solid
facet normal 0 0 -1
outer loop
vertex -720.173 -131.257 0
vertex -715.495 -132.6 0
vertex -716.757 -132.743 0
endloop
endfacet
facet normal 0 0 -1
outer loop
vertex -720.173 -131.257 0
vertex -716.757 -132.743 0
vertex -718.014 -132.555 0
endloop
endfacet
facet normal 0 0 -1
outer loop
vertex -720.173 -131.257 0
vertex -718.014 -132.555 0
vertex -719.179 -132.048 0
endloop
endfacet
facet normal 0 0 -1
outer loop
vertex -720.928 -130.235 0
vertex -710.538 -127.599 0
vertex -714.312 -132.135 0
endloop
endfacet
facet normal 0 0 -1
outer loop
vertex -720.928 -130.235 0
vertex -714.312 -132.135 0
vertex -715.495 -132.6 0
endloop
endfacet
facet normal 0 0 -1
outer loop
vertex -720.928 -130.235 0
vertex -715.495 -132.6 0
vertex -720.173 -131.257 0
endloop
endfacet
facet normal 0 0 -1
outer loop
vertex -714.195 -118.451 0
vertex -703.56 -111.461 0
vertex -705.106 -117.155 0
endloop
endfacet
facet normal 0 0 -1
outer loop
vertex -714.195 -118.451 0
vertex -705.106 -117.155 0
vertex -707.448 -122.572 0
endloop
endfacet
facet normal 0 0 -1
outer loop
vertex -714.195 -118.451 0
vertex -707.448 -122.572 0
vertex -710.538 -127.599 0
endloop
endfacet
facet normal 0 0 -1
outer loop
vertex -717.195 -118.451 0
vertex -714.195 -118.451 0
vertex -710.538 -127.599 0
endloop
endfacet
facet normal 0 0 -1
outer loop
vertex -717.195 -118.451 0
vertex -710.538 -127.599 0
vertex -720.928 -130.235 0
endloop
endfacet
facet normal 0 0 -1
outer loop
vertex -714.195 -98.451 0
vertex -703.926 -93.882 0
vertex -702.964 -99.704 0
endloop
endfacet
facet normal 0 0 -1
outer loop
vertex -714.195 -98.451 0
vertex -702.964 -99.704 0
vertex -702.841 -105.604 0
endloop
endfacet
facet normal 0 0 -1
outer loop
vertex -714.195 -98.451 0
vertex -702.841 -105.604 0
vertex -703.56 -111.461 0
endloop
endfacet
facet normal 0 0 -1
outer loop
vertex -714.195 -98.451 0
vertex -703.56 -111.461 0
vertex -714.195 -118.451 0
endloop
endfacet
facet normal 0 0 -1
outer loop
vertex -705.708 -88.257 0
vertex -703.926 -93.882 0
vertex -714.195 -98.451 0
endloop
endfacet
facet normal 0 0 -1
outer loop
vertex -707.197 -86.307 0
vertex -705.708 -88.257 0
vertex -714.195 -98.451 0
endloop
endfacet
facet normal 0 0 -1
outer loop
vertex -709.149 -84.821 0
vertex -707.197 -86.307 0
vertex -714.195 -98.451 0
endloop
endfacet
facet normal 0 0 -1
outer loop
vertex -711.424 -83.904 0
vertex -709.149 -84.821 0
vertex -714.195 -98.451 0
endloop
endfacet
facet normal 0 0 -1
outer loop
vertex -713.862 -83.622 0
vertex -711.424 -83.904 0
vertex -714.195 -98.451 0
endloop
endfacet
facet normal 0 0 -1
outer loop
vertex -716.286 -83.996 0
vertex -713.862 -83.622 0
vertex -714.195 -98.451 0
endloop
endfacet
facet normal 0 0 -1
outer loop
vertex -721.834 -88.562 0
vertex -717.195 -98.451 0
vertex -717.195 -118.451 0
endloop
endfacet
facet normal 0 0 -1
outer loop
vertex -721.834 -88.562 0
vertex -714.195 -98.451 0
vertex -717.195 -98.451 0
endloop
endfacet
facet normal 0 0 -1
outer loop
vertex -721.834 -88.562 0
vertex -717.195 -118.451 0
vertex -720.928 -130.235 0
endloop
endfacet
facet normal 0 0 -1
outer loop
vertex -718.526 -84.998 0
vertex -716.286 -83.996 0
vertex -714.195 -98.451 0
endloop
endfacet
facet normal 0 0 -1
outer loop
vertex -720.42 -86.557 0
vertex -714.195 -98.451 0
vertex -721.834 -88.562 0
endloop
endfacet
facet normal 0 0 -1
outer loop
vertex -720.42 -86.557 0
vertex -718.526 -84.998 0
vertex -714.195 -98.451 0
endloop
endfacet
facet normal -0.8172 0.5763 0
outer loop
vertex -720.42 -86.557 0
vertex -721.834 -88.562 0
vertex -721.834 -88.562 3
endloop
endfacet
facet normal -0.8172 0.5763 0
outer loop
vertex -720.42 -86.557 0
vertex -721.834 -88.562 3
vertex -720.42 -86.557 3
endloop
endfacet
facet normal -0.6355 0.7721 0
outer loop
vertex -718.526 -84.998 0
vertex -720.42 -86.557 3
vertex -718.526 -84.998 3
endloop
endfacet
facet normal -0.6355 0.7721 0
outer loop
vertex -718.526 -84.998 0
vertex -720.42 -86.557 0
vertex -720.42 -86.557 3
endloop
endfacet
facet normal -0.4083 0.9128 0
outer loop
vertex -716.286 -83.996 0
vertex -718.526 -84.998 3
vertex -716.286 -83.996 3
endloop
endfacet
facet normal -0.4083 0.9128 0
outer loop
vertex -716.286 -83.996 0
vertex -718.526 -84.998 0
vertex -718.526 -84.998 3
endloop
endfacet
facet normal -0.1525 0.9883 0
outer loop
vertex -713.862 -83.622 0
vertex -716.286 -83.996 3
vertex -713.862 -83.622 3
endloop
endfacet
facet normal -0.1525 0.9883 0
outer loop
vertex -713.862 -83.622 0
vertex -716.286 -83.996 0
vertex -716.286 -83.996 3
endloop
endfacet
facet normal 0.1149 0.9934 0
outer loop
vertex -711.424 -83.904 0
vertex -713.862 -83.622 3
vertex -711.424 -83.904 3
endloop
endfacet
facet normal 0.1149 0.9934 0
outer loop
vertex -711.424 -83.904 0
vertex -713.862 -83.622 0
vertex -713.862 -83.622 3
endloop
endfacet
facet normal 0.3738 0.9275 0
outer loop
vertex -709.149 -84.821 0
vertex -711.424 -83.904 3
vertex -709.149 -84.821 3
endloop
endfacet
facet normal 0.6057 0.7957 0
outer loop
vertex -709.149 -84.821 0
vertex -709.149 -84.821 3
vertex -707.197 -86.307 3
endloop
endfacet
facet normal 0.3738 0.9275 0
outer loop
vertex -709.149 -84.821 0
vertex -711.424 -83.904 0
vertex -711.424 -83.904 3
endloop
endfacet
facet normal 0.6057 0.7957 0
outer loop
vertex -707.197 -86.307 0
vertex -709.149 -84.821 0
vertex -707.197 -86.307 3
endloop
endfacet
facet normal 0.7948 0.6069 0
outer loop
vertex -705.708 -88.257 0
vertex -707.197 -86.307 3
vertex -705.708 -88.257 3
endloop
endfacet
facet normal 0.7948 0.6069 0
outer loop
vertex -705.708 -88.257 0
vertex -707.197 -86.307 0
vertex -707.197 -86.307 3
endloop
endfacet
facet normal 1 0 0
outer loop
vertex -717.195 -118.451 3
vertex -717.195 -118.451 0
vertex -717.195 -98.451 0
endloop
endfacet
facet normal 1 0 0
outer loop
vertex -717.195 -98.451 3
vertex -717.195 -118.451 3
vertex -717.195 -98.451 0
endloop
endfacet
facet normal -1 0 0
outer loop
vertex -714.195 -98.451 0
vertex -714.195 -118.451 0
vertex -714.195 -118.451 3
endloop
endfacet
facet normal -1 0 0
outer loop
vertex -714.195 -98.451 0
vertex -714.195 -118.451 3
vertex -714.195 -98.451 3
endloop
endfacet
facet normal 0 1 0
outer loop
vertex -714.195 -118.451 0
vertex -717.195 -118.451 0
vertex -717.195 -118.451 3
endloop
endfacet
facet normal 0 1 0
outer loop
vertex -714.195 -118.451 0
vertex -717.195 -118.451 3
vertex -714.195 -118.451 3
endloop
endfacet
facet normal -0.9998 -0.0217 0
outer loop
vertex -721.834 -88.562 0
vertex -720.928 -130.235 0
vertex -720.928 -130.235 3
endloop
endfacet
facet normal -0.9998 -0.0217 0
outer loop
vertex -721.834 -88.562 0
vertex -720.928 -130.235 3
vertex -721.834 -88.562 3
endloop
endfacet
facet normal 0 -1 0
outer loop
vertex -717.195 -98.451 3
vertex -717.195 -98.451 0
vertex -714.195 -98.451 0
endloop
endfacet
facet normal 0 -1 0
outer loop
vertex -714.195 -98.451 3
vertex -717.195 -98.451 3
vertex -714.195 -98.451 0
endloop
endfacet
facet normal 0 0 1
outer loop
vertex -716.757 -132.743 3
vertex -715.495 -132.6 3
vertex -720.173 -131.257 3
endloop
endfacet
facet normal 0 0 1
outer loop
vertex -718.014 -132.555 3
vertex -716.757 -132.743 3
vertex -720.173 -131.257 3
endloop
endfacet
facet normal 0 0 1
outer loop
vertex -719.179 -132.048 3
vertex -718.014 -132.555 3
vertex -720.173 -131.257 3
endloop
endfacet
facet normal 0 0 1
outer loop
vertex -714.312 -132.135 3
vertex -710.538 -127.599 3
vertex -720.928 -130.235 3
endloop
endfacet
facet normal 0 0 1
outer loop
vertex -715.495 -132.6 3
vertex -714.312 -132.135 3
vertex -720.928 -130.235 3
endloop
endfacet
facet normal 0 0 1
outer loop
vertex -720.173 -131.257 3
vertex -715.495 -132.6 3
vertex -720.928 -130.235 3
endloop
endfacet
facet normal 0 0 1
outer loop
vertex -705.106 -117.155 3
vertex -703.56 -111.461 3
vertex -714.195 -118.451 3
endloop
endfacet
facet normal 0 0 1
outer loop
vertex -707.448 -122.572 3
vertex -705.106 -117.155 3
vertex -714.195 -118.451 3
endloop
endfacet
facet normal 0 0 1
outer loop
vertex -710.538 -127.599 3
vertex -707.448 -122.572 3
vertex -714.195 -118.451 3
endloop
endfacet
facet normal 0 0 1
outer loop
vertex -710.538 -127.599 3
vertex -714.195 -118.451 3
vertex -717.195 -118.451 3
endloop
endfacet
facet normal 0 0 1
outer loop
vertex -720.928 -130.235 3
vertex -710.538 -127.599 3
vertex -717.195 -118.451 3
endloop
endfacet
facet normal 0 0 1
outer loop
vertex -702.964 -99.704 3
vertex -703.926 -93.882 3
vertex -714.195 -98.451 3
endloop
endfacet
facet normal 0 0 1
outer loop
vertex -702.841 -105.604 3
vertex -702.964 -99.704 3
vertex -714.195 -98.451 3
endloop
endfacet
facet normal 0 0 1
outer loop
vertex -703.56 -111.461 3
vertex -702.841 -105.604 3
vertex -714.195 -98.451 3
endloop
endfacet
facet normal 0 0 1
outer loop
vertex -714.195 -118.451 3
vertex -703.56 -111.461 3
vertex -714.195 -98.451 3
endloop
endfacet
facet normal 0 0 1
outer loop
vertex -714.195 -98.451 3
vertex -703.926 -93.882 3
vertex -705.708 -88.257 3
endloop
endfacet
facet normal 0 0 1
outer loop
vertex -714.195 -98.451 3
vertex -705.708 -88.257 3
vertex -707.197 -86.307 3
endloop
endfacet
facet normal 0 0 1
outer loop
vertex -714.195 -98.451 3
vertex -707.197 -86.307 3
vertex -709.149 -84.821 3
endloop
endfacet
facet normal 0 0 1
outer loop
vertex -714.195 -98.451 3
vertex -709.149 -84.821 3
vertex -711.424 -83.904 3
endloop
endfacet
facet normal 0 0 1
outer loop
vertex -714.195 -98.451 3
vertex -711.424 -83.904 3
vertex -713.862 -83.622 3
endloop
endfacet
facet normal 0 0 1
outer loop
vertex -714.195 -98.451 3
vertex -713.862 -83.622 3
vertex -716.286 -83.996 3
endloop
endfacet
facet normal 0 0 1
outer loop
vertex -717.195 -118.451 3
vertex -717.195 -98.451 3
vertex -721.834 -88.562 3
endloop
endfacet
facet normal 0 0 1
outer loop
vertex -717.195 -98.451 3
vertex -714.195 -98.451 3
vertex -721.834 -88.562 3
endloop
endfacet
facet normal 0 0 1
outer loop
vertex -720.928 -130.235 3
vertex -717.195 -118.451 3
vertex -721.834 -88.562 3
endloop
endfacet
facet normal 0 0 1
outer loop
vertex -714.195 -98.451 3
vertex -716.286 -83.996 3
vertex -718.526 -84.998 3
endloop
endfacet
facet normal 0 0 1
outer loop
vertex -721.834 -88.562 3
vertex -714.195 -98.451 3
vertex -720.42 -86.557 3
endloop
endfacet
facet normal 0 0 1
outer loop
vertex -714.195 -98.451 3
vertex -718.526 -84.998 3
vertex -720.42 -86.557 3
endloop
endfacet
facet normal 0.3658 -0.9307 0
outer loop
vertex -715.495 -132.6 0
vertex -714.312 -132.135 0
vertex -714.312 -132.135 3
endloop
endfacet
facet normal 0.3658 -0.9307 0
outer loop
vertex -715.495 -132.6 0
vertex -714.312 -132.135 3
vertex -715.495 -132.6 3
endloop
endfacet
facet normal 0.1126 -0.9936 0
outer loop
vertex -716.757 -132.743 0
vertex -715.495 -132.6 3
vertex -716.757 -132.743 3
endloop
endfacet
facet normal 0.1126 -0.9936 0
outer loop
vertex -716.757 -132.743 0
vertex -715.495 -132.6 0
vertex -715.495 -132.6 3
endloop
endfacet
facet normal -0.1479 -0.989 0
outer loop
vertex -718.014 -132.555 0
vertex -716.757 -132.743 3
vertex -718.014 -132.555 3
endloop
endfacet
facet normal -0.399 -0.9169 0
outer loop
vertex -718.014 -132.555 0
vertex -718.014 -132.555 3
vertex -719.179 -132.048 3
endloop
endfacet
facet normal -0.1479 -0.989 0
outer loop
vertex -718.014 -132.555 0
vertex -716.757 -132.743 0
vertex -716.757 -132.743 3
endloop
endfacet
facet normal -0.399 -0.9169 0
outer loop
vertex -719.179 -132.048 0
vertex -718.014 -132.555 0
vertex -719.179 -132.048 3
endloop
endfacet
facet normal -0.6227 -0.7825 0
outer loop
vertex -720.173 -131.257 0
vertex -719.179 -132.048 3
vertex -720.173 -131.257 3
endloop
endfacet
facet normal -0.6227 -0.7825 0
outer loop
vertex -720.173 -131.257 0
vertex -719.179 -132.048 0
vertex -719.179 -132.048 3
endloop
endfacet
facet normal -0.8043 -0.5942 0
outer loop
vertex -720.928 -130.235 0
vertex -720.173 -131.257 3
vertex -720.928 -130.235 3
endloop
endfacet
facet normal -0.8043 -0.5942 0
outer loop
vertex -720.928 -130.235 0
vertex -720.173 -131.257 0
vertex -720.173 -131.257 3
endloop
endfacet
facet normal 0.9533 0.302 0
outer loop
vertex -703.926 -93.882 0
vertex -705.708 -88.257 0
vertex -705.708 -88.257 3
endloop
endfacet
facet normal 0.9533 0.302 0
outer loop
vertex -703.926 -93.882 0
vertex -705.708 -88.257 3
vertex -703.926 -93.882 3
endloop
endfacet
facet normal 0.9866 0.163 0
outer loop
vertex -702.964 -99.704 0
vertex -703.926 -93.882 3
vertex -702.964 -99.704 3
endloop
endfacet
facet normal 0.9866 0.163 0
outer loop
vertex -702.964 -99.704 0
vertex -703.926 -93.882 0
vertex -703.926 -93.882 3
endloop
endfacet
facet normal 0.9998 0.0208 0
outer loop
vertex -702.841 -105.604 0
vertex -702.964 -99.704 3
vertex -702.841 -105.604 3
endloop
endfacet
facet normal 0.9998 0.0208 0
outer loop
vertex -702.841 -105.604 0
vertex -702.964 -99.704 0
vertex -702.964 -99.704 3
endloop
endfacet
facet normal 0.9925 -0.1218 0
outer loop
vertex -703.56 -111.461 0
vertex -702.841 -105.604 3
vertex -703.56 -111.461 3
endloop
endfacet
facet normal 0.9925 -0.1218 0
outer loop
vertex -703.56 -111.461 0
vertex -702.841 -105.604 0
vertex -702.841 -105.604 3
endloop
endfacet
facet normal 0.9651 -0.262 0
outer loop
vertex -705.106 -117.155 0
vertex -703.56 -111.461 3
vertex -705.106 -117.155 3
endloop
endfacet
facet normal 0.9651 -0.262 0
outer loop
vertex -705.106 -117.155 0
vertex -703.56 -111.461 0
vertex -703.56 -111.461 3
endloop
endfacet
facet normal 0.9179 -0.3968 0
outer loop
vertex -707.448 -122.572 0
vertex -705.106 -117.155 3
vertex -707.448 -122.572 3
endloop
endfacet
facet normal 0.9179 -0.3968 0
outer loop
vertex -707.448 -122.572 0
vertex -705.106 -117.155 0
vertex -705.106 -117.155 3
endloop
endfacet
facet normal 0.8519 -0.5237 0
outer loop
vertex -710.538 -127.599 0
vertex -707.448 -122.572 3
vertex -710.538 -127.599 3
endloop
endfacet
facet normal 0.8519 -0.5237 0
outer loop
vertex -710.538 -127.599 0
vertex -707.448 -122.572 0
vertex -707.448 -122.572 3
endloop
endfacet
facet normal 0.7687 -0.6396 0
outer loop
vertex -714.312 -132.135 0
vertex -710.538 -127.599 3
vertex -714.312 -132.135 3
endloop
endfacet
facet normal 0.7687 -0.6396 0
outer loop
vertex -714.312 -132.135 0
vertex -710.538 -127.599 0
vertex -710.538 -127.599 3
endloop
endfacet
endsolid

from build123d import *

# Parameters (mm, degrees)
SKETCH1_W          = 3
SKETCH1_H          = 20
BASE_EXTRUDE_DEPTH = 3


with BuildPart() as part:
    # Sketch1 → Base-Extrude (new body)
    with BuildSketch(Plane.XY):
        with BuildLine():
            Line((-720.928496368, -130.234955171), (-721.834448628, -88.561920568))
            ThreePointArc((-721.834448628, -88.561920568), (-713.861531309, -83.622429775), (-705.707617137, -88.257045566))
            ThreePointArc((-705.707617137, -88.257045566), (-703.559840829, -111.460770875), (-714.312380099, -132.134636275))
            ThreePointArc((-714.312380099, -132.134636275), (-718.013875072, -132.555038268), (-720.928496368, -130.234955171))
        make_face()
        with Locations((-715.695158937, -108.450949368)):
            Rectangle(SKETCH1_W, SKETCH1_H, mode=Mode.SUBTRACT)
    extrude(amount=BASE_EXTRUDE_DEPTH)


solid = part.part
